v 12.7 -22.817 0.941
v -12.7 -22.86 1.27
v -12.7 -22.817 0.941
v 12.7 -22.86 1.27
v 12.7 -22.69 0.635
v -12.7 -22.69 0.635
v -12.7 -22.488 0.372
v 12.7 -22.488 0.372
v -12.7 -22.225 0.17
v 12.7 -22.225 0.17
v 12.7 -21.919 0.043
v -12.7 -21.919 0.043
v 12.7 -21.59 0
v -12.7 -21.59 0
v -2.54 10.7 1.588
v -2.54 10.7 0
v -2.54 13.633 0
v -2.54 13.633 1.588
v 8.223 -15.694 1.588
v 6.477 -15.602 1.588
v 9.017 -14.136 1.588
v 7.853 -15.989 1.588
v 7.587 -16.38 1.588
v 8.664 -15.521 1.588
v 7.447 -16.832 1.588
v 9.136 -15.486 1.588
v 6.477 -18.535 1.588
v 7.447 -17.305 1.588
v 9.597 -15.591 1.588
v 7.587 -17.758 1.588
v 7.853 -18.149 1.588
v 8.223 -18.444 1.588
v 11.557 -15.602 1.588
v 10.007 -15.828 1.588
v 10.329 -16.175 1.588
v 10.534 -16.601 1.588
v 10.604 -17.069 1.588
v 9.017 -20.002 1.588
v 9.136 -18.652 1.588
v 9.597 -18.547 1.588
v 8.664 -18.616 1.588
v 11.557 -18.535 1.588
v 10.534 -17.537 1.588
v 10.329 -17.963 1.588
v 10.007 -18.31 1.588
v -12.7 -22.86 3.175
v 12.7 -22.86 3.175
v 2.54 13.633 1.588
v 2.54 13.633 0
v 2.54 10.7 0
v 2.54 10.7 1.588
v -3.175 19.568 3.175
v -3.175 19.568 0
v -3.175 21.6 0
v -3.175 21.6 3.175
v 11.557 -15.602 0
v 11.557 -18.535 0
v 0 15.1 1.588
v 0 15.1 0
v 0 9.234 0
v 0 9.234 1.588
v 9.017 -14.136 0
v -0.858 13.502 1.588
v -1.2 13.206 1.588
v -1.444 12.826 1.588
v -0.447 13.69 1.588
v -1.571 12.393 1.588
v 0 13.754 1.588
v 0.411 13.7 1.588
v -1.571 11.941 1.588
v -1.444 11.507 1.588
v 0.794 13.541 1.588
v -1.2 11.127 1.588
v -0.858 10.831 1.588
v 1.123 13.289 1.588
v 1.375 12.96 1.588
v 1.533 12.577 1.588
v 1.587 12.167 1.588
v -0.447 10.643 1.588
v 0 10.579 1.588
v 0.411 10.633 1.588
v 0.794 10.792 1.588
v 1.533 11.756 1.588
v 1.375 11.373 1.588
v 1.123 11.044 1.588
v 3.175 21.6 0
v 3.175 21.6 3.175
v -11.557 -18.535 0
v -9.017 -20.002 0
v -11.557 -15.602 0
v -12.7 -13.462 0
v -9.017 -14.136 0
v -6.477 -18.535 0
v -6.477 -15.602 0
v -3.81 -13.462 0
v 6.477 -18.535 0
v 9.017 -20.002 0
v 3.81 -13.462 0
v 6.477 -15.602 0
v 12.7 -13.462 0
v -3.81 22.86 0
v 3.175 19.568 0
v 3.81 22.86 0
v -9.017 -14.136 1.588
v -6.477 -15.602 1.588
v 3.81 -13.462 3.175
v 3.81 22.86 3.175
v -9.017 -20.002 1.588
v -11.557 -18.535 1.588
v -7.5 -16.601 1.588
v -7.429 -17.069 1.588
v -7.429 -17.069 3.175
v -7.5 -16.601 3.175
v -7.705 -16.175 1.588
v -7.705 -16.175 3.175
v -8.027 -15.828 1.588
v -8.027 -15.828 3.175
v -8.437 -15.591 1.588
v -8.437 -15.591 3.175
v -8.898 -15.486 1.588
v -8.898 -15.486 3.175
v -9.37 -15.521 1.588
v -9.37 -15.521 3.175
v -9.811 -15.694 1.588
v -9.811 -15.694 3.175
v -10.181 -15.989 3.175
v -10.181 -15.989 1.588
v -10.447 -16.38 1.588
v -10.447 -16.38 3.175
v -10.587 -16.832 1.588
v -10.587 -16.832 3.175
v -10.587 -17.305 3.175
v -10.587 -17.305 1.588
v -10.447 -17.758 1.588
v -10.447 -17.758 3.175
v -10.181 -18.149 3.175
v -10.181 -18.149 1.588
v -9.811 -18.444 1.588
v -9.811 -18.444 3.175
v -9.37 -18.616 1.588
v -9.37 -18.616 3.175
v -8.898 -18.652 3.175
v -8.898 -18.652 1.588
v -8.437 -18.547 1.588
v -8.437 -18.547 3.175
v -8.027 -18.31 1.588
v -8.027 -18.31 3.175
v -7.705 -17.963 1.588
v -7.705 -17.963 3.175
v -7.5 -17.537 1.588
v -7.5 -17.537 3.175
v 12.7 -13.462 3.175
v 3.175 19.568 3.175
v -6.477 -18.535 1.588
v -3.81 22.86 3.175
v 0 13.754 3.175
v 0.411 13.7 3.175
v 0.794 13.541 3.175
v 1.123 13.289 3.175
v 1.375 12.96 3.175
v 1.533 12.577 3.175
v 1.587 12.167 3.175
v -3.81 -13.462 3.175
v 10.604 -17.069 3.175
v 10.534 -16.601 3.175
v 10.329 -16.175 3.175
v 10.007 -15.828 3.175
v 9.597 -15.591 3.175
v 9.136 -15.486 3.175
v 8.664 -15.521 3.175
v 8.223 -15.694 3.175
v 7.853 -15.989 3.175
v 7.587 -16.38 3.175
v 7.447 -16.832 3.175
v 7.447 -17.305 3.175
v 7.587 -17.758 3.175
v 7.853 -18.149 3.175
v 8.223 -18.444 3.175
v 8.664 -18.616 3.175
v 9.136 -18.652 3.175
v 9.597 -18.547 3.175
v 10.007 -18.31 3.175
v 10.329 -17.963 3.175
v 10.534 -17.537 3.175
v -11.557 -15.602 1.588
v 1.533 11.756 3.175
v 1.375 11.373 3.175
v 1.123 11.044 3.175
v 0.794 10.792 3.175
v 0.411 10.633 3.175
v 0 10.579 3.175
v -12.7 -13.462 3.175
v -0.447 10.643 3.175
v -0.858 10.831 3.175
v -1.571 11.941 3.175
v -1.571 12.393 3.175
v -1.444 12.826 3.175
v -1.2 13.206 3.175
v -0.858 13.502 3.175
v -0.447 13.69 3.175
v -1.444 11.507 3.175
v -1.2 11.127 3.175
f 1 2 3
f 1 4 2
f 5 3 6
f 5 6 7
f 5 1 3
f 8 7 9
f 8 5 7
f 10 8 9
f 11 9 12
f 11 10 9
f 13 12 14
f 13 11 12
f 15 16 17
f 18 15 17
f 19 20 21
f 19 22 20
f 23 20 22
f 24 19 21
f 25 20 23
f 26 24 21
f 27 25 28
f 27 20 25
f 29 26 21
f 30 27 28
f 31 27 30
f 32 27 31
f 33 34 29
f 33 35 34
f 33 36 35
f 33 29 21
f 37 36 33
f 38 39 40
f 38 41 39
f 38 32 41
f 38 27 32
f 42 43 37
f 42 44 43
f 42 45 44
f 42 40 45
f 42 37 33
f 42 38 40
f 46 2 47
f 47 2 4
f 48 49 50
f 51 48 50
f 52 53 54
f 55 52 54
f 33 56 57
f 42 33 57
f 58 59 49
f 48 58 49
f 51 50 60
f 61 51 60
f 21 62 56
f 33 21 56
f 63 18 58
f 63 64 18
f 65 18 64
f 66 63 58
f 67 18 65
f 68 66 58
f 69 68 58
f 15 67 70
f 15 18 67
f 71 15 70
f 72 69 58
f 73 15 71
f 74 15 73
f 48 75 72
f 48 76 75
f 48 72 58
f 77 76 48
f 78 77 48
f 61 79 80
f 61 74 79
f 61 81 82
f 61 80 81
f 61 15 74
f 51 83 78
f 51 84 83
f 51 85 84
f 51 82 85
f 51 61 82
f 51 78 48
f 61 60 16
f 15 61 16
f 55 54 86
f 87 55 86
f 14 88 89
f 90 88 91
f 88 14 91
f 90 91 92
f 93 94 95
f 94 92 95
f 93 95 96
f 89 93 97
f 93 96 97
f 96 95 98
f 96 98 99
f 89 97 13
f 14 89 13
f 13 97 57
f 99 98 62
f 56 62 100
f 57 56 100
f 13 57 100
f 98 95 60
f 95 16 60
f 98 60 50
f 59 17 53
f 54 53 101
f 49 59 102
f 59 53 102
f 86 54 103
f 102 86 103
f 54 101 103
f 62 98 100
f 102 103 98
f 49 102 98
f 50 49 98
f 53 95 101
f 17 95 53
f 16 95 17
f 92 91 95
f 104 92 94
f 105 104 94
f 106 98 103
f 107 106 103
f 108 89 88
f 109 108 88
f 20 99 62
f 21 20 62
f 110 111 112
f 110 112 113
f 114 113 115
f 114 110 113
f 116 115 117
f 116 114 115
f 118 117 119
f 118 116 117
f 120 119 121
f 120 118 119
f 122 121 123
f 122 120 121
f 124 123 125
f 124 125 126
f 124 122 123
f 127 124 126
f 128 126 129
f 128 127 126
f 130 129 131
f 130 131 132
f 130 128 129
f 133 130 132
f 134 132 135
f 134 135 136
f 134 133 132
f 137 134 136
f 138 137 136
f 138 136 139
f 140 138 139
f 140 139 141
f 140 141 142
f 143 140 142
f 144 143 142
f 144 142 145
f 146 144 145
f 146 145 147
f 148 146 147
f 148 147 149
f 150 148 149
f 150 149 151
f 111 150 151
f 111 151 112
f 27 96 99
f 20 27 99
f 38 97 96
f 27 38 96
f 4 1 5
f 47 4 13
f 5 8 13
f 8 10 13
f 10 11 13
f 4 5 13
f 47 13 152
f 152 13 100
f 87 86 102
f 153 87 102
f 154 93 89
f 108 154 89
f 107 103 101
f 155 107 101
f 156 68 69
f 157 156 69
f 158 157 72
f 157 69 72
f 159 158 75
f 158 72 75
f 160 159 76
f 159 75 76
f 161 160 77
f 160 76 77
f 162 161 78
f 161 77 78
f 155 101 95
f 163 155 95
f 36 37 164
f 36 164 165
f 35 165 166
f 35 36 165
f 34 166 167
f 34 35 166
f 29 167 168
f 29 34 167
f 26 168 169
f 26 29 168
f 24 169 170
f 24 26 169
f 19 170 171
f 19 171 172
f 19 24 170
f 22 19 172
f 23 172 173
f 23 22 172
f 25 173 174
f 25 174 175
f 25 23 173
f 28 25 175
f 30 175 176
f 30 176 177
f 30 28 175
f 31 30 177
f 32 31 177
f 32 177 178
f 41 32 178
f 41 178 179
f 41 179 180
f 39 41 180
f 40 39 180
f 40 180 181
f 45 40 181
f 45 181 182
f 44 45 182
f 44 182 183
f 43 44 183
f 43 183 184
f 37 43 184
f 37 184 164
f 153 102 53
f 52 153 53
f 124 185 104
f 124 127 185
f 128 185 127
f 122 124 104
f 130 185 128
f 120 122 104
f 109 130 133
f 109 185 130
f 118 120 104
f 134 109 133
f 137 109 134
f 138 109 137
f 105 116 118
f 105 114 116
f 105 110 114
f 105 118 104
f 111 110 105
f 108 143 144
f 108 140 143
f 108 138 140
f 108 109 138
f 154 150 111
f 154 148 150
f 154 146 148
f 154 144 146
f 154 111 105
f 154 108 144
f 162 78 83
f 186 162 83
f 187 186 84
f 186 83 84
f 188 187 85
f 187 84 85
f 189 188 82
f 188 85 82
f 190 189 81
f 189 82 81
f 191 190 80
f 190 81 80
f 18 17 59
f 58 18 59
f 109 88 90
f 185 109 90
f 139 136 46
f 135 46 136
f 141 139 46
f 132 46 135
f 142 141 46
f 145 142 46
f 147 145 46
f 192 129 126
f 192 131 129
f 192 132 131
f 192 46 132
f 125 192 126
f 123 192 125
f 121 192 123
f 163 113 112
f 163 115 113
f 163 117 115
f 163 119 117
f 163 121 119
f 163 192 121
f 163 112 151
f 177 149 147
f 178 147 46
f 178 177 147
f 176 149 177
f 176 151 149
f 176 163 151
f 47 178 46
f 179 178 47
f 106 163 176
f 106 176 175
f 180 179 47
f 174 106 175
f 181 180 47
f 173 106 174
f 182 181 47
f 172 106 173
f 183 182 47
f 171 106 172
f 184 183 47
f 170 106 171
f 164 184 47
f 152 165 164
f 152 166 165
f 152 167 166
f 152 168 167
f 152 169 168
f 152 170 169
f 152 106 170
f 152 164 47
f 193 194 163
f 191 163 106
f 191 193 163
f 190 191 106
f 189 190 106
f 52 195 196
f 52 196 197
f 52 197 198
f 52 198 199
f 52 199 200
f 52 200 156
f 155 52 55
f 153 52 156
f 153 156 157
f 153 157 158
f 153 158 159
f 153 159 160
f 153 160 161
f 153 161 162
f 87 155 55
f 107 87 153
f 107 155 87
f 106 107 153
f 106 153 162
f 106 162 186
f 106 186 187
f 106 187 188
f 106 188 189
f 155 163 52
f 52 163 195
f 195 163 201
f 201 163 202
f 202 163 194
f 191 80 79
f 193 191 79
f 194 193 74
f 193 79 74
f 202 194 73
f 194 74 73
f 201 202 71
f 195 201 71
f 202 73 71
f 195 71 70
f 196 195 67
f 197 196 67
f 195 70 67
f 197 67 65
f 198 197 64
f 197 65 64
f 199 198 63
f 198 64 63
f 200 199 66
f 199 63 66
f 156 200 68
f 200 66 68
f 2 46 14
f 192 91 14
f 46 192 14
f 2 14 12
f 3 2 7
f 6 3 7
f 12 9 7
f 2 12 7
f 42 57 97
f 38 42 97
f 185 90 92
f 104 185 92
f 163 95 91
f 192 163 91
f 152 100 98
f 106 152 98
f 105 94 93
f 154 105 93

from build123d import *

# Parameters (mm, degrees)
F0_R     = 1.5875
F1_DEPTH = 3.175
F2_R     = 1.27
F4_DEPTH = 1.5875


with BuildPart() as f1:
    # F0 (on Top) → F1 (new body)
    with BuildSketch(Plane.XY):
        with BuildLine():
            ThreePointArc((0, 13.7541), (1.122532, 13.289132), (1.5875, 12.1666))
            ThreePointArc((1.5875, 12.1666), (1.122532, 11.044068), (0, 10.5791))
            Line((0, 10.5791), (0, -22.86))
            Line((0, -22.86), (12.7, -22.86))
            Line((12.7, -22.86), (12.7, -13.462))
            Line((12.7, -13.462), (3.81, -13.462))
            Line((3.81, -13.462), (3.81, 22.86))
            Line((3.81, 22.86), (0, 22.86))
            Line((0, 22.86), (0, 21.600245))
            Line((0, 21.600245), (3.175, 21.600245))
            Line((3.175, 21.600245), (3.175, 19.568245))
            Line((3.175, 19.568245), (0, 19.568245))
            Line((0, 19.568245), (0, 13.7541))
        make_face()
        with Locations((9.017, -17.0688)):
            Circle(F0_R, mode=Mode.SUBTRACT)
        with BuildLine():
            ThreePointArc((0, 10.5791), (-1.5875, 12.1666), (0, 13.7541))
            Line((0, 13.7541), (0, 19.568245))
            Line((0, 19.568245), (-3.175, 19.568245))
            Line((-3.175, 19.568245), (-3.175, 21.600245))
            Line((-3.175, 21.600245), (0, 21.600245))
            Line((0, 21.600245), (0, 22.86))
            Line((0, 22.86), (-3.81, 22.86))
            Line((-3.81, 22.86), (-3.81, -13.462))
            Line((-3.81, -13.462), (-12.7, -13.462))
            Line((-12.7, -13.462), (-12.7, -22.86))
            Line((-12.7, -22.86), (0, -22.86))
            Line((0, -22.86), (0, 10.5791))
        make_face()
        with Locations((-9.017, -17.0688)):
            Circle(F0_R, mode=Mode.SUBTRACT)
    extrude(amount=F1_DEPTH)

    # F2
    f2_edges = [f1.edges().sort_by_distance(p)[0] for p in [
        (0, -22.86, 0),
    ]]
    fillet(f2_edges, radius=F2_R)

    # F3 (on face) → F4 (cut)
    with BuildSketch(Plane(origin=(0, 0, 0), x_dir=(1, 0, 0), z_dir=(0, 0, -1))):
        Polygon((-6.477, 18.53527), (-9.017, 20.001739), (-11.557, 18.53527), (-11.557, 15.60233), (-9.017, 14.135861), (-6.477, 15.60233), align=None)
        Polygon((9.017, 20.001739), (6.477, 18.53527), (6.477, 15.60233), (9.017, 14.135861), (11.557, 15.60233), (11.557, 18.53527), align=None)
        Polygon((2.54, -10.70013), (0, -9.233661), (-2.54, -10.70013), (-2.54, -13.63307), (0, -15.099539), (2.54, -13.63307), align=None)
    extrude(amount=-F4_DEPTH, mode=Mode.SUBTRACT)


solid = f1.part
